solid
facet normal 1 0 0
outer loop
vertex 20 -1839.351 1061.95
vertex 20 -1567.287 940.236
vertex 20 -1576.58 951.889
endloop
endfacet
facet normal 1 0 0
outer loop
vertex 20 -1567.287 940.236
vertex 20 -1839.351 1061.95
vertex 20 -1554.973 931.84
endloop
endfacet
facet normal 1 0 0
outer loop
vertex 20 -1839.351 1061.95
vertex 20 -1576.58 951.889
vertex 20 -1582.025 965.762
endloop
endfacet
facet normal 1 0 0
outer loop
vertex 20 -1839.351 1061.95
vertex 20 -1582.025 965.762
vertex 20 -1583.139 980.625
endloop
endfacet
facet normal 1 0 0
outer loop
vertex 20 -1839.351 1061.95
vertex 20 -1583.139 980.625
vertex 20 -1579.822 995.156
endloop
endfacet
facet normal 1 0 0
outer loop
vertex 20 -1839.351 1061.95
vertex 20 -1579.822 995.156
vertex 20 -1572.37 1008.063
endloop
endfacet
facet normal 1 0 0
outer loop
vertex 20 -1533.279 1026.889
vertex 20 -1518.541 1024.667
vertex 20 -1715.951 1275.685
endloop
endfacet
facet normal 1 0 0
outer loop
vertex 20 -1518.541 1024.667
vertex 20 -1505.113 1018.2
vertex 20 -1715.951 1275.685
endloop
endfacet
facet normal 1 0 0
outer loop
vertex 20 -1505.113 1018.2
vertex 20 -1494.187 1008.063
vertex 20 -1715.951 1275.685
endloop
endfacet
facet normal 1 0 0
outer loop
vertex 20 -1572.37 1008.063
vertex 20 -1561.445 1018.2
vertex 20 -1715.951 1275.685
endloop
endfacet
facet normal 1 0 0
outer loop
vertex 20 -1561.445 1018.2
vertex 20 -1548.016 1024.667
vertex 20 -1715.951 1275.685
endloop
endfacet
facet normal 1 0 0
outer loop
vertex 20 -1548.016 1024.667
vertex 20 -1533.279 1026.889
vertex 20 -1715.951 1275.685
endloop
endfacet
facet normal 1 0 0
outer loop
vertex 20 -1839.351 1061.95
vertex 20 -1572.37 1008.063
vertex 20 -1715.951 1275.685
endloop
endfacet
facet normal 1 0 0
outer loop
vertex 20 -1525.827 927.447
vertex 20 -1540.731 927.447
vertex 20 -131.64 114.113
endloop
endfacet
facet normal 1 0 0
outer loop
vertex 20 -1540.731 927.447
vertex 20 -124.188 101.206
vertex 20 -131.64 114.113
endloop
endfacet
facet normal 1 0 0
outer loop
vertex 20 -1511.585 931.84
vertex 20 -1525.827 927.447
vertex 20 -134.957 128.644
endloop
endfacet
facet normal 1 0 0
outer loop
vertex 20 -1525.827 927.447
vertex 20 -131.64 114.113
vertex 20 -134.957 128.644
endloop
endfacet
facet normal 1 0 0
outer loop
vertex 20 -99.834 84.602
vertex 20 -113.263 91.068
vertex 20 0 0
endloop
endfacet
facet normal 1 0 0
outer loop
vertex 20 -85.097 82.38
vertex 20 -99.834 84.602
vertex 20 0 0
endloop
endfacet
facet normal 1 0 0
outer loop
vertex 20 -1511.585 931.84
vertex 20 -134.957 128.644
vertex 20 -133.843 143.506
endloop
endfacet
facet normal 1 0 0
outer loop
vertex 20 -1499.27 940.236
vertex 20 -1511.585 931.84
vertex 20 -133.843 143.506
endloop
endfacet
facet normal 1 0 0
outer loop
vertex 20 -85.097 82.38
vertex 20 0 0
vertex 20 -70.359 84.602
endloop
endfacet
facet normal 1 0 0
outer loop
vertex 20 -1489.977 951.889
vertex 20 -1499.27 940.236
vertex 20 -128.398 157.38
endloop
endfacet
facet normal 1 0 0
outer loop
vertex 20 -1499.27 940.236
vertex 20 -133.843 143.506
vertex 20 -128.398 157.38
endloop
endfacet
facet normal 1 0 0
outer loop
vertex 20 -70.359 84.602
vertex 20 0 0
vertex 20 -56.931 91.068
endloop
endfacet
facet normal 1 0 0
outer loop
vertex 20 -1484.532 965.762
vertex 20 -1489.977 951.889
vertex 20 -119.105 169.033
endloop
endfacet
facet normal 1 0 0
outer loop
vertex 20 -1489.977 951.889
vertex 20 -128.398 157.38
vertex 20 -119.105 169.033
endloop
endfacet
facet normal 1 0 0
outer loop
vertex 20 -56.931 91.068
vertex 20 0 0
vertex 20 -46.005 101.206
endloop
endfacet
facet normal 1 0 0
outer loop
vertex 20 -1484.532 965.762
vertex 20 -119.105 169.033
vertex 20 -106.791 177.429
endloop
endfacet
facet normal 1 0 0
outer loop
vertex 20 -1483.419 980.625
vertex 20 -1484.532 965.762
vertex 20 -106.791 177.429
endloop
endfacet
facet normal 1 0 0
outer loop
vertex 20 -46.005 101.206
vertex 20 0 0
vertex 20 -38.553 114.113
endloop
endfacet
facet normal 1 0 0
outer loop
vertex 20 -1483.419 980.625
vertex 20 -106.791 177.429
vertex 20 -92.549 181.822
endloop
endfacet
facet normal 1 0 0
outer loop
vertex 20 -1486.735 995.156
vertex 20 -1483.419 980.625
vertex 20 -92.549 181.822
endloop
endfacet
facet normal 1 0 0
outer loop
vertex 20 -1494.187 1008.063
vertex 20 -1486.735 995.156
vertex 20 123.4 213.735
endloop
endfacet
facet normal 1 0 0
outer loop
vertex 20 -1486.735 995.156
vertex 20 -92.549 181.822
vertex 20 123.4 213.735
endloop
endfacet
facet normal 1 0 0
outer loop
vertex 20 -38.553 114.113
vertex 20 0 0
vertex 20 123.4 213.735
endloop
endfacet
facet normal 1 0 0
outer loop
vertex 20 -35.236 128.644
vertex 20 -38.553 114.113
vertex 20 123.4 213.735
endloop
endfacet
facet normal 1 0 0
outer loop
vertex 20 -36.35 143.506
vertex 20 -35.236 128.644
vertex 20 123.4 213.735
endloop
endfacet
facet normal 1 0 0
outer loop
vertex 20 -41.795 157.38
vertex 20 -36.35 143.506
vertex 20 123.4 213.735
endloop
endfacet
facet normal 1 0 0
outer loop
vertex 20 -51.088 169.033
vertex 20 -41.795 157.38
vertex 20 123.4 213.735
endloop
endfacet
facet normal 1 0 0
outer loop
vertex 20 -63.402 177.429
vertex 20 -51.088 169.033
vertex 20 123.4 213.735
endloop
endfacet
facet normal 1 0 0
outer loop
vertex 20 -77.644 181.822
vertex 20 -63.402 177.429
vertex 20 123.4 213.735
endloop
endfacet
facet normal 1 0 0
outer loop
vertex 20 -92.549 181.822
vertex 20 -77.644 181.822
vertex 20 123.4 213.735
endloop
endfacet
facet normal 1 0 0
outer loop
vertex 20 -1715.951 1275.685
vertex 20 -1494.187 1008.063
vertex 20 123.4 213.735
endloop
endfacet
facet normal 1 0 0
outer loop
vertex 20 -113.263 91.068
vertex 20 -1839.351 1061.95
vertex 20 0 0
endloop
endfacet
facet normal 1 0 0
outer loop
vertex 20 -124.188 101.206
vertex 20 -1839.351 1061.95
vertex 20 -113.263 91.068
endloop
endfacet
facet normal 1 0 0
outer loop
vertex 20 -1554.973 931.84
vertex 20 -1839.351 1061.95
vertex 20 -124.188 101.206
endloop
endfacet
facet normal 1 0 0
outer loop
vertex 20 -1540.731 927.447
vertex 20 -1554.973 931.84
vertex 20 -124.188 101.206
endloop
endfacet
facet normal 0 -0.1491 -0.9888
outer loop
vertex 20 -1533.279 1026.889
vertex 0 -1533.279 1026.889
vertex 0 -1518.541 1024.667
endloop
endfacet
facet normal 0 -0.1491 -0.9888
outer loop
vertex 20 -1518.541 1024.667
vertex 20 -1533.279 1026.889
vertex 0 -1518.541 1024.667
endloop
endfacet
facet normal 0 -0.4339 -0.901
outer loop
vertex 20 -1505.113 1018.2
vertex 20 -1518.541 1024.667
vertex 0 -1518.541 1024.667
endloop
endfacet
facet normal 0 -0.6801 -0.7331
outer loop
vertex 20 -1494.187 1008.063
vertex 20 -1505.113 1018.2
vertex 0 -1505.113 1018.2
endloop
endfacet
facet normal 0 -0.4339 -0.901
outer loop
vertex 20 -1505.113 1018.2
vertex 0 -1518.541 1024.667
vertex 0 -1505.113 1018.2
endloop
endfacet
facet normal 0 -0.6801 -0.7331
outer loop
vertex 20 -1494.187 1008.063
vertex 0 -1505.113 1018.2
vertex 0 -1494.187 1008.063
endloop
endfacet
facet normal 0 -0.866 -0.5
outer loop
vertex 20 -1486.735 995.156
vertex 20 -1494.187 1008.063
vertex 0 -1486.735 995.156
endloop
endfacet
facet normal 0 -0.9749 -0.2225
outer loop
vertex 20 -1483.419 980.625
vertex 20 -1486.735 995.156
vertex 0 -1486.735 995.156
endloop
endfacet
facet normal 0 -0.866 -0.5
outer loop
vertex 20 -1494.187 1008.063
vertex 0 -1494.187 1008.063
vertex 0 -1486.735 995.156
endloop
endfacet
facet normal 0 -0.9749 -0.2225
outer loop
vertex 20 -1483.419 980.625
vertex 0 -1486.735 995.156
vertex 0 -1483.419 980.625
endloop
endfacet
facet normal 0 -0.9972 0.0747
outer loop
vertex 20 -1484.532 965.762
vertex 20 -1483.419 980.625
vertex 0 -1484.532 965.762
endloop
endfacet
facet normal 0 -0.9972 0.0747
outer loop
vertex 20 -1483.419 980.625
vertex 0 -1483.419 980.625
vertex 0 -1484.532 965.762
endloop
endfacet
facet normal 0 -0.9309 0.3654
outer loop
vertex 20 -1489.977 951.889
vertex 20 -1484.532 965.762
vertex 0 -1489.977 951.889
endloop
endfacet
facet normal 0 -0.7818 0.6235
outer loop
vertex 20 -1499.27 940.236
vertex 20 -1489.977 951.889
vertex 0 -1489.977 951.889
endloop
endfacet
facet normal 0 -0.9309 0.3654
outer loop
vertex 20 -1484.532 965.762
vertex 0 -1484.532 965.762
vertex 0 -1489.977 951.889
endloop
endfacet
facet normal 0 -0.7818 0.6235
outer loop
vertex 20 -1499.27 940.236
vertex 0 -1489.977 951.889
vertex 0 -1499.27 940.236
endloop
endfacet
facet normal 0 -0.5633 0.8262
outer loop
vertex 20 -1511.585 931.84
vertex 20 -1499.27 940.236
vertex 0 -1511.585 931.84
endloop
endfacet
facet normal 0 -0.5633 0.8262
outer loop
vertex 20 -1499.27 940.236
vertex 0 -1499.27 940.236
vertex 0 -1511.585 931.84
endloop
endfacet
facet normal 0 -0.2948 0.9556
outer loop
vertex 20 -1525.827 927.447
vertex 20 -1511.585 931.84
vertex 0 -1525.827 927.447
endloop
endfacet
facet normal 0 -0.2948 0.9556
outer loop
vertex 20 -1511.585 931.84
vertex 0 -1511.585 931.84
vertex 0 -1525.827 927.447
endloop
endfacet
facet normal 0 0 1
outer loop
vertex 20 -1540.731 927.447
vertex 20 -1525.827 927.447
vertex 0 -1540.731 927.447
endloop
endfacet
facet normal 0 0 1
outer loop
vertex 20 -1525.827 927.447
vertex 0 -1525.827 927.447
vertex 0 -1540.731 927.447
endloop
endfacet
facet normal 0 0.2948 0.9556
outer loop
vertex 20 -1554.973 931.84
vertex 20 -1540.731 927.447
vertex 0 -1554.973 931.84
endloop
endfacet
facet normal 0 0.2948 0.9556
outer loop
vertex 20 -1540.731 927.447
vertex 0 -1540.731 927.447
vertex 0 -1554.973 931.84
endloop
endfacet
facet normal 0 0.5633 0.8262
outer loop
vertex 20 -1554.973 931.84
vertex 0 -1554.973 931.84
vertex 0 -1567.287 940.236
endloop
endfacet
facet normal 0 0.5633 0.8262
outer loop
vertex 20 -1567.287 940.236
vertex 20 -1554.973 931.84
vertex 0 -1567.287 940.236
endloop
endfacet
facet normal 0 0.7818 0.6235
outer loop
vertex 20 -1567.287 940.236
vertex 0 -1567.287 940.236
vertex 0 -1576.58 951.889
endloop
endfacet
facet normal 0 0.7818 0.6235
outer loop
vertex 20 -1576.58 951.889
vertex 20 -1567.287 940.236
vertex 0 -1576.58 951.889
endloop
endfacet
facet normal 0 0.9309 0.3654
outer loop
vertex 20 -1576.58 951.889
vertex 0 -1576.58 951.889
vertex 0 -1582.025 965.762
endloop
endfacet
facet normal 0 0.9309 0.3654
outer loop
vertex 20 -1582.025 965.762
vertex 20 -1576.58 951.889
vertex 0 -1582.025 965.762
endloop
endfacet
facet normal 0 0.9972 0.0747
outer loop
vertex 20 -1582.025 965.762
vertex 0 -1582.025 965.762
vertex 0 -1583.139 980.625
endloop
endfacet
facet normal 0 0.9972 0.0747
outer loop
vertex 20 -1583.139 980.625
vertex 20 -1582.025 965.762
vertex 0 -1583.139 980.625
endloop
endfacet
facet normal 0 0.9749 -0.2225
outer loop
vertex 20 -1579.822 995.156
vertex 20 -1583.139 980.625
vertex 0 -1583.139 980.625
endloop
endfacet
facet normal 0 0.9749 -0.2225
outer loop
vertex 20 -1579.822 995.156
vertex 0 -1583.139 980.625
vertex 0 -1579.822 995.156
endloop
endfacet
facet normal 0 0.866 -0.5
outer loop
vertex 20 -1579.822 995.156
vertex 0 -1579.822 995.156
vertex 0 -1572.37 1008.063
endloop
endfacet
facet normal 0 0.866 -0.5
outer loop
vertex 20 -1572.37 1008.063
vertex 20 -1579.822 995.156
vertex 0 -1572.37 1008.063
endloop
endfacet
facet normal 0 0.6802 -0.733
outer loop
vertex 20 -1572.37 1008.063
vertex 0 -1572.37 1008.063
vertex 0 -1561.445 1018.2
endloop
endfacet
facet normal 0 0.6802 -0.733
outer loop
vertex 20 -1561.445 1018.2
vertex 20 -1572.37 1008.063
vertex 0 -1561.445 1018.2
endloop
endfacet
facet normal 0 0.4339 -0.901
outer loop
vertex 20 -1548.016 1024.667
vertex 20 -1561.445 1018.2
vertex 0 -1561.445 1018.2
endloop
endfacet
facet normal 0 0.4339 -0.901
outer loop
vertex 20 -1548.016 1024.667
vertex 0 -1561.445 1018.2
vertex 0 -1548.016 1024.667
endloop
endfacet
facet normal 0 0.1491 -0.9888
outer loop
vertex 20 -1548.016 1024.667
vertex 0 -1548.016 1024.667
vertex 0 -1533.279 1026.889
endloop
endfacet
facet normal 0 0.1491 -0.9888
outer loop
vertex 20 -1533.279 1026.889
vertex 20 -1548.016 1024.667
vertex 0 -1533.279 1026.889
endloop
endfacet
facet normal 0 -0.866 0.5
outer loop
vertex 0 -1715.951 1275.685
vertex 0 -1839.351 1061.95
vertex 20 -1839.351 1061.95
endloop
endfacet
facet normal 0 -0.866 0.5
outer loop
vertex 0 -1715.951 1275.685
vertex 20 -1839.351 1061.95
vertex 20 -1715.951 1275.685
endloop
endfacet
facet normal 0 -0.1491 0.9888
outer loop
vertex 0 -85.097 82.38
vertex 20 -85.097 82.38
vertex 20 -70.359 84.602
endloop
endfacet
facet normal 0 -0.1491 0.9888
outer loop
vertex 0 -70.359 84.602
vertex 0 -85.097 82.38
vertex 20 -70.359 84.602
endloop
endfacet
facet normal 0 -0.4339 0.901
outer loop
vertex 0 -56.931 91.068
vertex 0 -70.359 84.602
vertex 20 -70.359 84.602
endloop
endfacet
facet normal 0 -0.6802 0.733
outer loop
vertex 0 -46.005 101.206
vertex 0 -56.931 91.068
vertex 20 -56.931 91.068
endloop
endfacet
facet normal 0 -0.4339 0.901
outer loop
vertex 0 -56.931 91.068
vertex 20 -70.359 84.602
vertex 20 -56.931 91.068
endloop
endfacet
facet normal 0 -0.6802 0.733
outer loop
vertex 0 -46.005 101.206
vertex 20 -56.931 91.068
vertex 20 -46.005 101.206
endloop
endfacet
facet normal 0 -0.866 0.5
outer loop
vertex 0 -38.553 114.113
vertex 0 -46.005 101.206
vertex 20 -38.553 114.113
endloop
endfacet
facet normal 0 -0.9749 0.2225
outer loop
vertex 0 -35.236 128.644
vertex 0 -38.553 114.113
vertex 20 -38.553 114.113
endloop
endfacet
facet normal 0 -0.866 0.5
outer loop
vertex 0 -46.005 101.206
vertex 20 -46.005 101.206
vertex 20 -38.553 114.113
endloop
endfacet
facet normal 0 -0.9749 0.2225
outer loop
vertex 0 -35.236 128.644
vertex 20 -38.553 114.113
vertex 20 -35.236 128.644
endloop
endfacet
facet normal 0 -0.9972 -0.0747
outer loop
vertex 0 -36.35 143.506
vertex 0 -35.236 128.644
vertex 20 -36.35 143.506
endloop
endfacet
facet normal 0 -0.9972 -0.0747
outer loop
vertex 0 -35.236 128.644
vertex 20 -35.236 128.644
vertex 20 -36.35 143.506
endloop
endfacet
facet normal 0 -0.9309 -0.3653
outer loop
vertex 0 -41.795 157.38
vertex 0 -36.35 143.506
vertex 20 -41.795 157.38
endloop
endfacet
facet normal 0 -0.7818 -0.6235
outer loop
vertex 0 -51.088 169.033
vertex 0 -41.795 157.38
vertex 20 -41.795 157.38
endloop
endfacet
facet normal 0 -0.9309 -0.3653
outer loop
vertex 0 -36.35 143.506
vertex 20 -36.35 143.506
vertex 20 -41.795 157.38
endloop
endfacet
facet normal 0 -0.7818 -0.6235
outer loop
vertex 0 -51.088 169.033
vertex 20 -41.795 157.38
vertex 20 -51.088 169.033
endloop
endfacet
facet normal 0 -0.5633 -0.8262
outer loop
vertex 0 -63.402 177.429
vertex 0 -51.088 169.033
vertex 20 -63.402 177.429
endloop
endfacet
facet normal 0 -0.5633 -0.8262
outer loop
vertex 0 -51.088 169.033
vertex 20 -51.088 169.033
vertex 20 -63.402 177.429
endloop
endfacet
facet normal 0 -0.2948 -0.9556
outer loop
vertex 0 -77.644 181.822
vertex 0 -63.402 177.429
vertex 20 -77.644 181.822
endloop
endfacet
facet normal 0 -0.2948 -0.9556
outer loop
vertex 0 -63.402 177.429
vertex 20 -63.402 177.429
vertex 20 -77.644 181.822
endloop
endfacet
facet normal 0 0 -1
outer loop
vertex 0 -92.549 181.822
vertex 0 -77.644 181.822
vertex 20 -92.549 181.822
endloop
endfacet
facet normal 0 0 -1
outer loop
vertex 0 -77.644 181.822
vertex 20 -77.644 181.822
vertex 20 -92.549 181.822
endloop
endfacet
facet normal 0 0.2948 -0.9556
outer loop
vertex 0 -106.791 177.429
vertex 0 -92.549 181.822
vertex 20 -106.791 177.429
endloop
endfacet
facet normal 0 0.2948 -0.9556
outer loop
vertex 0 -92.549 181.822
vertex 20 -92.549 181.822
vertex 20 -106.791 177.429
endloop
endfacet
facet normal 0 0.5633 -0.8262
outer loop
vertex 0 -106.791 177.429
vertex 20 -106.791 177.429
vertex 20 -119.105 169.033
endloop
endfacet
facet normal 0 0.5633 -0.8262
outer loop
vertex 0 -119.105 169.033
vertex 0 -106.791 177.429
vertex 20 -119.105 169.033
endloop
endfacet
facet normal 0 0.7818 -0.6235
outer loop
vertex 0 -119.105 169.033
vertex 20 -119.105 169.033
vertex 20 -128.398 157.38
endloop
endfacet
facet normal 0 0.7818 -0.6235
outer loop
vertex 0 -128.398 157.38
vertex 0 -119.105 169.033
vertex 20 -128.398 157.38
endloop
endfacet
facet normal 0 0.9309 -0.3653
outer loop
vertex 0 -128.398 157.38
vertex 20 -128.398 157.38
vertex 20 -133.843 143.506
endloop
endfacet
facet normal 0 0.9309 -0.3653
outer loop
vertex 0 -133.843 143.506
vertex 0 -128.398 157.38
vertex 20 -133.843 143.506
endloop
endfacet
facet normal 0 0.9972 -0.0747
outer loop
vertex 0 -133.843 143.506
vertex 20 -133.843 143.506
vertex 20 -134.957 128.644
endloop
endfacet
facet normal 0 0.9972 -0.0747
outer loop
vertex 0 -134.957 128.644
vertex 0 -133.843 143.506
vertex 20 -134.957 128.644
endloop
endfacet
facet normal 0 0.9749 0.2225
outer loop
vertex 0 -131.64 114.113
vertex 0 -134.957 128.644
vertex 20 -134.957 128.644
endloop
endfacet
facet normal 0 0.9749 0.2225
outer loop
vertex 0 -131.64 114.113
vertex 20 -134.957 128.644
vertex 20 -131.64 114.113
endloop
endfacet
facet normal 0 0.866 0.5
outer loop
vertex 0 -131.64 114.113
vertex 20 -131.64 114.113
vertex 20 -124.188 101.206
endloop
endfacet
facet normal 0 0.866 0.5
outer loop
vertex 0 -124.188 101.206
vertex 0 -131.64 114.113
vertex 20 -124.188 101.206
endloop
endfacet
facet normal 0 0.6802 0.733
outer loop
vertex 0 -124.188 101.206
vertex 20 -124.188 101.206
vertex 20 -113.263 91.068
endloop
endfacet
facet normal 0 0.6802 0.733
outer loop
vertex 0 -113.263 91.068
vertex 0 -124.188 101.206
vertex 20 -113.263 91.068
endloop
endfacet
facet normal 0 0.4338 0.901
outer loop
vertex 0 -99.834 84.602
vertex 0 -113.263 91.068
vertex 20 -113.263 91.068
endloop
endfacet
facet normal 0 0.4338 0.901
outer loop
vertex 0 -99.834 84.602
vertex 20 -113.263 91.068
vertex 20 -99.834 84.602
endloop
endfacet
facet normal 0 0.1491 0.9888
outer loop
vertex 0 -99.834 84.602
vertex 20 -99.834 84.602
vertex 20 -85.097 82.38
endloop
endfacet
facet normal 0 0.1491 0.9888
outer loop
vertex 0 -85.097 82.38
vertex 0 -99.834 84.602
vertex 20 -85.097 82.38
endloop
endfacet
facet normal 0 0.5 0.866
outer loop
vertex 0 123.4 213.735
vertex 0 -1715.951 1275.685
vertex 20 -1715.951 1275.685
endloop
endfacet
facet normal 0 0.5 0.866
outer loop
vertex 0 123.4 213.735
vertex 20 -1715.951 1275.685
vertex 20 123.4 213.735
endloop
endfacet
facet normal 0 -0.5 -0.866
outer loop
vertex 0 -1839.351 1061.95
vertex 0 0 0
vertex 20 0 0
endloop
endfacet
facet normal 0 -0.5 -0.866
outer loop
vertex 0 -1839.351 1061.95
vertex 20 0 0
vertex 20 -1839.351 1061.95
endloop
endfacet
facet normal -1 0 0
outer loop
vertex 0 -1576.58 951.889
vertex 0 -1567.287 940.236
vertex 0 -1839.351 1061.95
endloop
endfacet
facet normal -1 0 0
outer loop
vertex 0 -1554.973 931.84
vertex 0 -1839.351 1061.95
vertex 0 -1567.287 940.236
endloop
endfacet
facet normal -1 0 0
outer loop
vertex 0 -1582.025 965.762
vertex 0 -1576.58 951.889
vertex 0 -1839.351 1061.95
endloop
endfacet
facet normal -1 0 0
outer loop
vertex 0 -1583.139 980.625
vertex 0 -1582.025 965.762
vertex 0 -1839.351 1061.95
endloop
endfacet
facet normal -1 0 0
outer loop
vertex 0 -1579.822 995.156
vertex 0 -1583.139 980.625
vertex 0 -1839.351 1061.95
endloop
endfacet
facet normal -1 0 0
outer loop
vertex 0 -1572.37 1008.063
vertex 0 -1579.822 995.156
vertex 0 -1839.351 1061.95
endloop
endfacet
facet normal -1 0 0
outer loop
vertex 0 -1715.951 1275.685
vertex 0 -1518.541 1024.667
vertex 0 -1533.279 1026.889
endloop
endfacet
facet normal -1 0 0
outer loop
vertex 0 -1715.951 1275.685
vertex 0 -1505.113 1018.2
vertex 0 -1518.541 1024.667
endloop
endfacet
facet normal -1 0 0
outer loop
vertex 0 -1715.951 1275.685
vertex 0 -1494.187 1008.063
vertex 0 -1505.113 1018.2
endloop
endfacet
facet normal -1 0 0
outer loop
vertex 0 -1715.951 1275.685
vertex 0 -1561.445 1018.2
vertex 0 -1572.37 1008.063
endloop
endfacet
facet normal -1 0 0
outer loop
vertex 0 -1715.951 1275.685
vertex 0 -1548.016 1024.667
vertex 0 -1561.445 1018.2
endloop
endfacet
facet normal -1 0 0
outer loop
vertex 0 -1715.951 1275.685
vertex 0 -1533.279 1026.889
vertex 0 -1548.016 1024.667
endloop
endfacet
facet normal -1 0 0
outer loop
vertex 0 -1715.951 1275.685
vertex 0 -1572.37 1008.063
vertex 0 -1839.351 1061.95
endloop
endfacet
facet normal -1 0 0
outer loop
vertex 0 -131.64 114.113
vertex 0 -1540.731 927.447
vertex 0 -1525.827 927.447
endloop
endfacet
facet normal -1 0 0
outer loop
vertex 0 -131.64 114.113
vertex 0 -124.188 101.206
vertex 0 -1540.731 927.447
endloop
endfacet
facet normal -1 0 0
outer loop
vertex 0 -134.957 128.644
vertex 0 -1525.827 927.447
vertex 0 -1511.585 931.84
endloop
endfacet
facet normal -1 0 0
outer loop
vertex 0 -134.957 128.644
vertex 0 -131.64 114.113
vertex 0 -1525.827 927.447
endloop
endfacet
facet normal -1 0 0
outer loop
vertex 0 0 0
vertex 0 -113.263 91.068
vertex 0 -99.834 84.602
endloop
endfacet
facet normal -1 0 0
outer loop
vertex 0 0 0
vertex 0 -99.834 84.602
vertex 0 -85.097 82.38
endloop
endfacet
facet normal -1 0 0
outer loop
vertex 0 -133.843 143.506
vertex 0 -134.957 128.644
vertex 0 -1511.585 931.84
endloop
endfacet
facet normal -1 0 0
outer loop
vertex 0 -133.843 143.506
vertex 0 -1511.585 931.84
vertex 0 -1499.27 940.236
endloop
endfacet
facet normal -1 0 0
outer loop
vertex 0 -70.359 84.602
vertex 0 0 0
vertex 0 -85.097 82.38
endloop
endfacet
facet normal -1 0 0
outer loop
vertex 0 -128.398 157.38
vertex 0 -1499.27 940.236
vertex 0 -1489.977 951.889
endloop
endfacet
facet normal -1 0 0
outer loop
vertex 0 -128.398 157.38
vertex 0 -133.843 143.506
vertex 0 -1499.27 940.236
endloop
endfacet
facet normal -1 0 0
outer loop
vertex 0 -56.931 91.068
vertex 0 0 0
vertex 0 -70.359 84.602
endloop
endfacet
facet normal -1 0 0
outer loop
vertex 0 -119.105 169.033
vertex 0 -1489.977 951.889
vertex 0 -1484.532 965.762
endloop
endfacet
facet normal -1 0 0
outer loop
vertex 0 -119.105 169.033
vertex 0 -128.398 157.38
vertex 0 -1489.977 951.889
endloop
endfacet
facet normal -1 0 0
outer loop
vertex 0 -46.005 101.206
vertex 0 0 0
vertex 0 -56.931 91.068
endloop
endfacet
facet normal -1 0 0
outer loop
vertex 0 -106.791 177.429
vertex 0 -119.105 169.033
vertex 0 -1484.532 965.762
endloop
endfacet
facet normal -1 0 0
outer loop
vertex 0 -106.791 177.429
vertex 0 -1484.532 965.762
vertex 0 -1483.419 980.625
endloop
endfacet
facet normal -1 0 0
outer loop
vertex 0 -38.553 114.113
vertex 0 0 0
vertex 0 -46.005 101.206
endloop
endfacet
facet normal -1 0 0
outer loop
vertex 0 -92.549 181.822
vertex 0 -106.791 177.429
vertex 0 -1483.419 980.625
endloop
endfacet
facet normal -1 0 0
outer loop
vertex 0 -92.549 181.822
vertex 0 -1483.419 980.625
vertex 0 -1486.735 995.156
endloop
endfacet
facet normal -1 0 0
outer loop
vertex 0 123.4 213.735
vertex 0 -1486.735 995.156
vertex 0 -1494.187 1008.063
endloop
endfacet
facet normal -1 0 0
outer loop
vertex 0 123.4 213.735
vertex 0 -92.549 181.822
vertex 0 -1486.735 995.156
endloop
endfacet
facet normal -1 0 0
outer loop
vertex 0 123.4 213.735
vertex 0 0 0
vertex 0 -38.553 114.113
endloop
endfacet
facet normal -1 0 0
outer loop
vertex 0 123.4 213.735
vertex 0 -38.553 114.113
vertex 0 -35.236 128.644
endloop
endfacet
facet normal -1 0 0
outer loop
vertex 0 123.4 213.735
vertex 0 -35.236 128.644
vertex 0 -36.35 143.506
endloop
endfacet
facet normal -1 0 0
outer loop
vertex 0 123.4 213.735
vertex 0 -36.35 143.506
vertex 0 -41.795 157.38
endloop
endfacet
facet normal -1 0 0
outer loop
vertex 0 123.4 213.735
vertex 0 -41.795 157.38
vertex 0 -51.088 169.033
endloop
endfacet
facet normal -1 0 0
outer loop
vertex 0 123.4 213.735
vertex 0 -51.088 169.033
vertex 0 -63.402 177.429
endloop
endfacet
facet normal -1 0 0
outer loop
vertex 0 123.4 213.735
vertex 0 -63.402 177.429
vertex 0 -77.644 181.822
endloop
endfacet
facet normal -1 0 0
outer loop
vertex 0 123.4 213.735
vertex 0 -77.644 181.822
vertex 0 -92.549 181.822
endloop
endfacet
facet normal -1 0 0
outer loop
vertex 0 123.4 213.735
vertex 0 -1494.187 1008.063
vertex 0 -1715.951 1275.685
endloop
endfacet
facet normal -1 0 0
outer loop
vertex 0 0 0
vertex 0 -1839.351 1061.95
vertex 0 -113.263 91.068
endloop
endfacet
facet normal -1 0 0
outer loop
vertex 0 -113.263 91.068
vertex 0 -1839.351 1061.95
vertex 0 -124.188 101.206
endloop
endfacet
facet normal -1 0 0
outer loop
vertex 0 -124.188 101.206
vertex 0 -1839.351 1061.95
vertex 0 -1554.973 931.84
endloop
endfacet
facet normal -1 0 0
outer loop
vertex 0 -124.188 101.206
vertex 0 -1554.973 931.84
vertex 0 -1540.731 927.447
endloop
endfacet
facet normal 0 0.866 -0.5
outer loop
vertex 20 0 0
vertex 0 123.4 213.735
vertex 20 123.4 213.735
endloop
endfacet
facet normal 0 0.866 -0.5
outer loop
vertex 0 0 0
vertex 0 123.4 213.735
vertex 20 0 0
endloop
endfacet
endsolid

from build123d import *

# Parameters (mm, degrees)
BOSS_EXTRUDE1_DEPTH = 20
SKETCH2_R           = 50
CUT_EXTRUDE4_DEPTH  = 2239.523130199
SKETCH3_R           = 50
CUT_EXTRUDE6_DEPTH  = 2239.523130199


with BuildPart() as part:
    # Sketch1 → Boss-Extrude1 (new body)
    with BuildSketch(Plane(origin=(0, 0, 0), x_dir=(0, 0, -1), z_dir=(1, 0, 0))):
        Polygon((0, 0), (-1061.95, -1839.351355098), (-1275.685069654, -1715.951355098), (-213.735069654, 123.4), align=None)
    extrude(amount=BOSS_EXTRUDE1_DEPTH)

    # Sketch2 → Cut-Extrude4 (cut, through all)
    with BuildSketch(Plane.ZY):
        with Locations((976.888502518, -1533.278698946)):
            Circle(SKETCH2_R)
    extrude(amount=-CUT_EXTRUDE4_DEPTH, mode=Mode.SUBTRACT)

    # Sketch3 → Cut-Extrude6 (cut, through all)
    with BuildSketch(Plane(origin=(20, 0, 0), x_dir=(0, 0, -1), z_dir=(1, 0, 0))):
        with Locations((-132.380349241, -85.096529142)):
            Circle(SKETCH3_R)
    extrude(amount=-CUT_EXTRUDE6_DEPTH, mode=Mode.SUBTRACT)


solid = part.part
